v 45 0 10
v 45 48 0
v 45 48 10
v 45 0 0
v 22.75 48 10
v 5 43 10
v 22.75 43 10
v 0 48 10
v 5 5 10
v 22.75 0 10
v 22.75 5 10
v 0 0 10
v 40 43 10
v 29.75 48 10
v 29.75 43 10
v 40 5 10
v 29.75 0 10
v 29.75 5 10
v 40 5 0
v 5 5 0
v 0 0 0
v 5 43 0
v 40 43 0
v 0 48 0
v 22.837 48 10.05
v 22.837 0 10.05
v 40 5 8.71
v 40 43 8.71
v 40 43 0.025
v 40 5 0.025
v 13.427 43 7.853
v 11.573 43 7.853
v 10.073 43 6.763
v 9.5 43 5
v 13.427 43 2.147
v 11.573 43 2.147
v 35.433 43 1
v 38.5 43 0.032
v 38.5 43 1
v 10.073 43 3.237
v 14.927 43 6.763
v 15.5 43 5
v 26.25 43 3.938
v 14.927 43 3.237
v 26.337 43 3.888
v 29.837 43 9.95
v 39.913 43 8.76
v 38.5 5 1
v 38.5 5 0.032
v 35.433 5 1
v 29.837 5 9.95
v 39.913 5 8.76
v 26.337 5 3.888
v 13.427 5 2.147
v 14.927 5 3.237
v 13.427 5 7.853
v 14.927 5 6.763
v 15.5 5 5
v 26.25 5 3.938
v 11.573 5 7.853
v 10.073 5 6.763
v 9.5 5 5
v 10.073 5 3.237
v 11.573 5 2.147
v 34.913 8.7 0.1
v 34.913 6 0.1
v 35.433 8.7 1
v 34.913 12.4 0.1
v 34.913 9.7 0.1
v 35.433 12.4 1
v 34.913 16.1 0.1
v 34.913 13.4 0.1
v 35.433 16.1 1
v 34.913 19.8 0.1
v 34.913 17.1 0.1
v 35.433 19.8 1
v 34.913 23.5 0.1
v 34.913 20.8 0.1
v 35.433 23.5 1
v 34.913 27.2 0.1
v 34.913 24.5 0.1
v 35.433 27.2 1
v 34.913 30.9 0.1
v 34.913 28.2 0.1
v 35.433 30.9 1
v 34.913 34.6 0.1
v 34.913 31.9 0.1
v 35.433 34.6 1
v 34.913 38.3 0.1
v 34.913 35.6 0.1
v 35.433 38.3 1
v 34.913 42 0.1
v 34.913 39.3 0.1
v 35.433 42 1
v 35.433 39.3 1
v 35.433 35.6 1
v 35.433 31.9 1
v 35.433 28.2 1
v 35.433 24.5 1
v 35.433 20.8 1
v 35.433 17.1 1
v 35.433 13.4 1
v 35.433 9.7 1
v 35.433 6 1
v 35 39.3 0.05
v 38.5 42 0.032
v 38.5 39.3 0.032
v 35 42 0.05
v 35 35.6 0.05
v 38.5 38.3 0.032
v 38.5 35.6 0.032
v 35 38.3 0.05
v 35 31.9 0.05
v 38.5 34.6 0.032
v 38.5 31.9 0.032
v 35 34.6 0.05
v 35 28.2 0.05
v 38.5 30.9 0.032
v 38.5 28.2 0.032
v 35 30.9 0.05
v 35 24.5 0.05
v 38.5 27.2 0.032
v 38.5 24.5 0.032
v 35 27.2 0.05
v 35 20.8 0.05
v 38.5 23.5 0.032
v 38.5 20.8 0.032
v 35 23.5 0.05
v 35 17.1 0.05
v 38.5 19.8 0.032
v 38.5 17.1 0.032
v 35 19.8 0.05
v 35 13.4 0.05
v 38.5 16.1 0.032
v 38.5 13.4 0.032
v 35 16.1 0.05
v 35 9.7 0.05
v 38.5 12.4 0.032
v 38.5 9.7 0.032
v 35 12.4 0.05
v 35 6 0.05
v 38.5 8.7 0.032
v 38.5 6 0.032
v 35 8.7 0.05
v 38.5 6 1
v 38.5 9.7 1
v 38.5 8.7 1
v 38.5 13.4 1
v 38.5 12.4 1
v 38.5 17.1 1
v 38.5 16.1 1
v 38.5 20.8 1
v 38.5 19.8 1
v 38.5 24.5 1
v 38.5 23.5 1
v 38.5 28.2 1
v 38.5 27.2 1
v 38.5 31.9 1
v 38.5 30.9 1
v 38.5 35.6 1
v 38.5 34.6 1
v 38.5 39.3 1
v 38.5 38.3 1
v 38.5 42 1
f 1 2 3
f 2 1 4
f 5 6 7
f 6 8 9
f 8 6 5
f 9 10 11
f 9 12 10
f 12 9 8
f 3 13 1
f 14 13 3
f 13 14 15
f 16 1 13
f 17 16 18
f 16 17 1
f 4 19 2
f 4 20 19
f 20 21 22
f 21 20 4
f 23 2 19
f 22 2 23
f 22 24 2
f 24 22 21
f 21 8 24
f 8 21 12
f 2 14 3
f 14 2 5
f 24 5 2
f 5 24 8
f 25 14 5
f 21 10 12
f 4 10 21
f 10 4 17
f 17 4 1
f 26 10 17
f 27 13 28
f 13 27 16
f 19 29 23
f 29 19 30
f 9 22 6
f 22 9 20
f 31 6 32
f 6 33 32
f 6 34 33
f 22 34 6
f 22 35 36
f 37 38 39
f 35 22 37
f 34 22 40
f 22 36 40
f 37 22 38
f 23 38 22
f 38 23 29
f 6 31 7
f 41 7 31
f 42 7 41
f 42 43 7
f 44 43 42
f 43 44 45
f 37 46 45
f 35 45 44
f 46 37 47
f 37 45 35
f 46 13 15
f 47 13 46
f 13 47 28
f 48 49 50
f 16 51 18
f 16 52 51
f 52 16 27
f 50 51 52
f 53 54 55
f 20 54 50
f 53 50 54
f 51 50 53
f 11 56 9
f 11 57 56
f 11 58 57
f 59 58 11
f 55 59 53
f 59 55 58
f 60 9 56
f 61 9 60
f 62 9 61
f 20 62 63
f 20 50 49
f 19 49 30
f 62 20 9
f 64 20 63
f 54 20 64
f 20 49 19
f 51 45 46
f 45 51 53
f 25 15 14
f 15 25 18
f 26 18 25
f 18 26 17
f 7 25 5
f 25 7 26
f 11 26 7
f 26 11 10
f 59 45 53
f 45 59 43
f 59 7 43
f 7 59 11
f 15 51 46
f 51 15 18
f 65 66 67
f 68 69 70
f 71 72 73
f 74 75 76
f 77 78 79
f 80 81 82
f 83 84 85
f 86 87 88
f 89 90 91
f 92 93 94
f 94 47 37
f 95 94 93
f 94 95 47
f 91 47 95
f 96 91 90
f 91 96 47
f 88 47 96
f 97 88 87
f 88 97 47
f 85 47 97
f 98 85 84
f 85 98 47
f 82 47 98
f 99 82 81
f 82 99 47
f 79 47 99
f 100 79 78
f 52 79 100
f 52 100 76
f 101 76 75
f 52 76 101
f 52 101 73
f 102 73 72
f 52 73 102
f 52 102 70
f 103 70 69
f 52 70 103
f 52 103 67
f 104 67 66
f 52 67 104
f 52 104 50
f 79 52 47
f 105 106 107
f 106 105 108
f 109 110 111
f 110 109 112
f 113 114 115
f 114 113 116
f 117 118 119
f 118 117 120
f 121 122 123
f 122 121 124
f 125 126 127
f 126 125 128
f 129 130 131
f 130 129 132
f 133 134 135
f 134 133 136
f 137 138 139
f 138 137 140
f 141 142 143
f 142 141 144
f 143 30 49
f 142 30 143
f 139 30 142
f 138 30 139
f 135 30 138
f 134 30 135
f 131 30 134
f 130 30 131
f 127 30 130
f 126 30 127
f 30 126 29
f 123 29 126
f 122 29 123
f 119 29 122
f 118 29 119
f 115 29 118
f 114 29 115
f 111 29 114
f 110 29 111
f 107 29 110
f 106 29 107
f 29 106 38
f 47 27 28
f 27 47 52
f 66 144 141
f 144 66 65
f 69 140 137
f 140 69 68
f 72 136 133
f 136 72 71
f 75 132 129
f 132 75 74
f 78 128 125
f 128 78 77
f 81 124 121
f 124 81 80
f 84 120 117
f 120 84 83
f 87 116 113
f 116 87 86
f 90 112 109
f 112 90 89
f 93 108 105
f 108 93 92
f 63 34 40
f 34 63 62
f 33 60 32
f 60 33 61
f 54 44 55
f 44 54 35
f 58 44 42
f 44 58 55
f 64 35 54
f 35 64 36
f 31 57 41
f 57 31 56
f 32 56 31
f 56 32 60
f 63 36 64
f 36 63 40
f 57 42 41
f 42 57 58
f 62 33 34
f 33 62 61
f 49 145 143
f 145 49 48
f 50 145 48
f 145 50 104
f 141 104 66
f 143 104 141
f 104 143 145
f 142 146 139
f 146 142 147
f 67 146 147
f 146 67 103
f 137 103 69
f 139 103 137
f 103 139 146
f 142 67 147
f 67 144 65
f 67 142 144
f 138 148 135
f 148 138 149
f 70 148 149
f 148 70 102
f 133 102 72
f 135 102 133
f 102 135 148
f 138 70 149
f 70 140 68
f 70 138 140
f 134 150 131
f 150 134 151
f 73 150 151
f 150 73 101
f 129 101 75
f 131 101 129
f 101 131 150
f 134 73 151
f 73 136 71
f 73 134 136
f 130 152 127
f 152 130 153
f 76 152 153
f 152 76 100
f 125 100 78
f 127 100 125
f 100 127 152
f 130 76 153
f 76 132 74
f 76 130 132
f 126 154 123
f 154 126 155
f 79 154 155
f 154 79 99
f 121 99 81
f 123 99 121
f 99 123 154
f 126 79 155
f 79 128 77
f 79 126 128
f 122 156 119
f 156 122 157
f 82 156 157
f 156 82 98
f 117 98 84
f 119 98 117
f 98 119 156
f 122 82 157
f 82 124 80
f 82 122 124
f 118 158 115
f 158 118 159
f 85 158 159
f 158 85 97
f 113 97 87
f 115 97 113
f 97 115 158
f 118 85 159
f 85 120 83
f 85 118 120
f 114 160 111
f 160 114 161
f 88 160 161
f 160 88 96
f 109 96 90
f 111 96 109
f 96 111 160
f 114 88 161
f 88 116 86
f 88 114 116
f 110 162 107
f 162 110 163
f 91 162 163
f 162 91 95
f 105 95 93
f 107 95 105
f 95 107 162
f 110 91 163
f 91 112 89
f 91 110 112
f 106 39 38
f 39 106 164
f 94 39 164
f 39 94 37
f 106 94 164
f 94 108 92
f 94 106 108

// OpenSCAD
/*
this is a buckle 
used to lock on the strap in certain direction
allow it to move in one direction for the tightining
** still work in progress and testing




*/
tri_h=7;
lock_h=10;
lock_l=45;
lock_w=48;
upper_tri_y=26.25;
space=3.7;
wall_t=5;
tri2_h=10;
difference(){
union(){
difference(){
cube([lock_l,lock_w,lock_h]);
    translate([wall_t,wall_t,0])cube([lock_l-2*wall_t,lock_w-2*wall_t,lock_h]);
}

translate([upper_tri_y,0,lock_h])
translate([0,0,-tri_h*sin(60)])
hull(){
rotate([0,30,0])cube([.1,lock_w,tri_h]);
rotate([0,-30,0])cube([.1,lock_w,tri_h]);}

translate([lock_l-wall_t,0,0.05])
rotate([0,180,0])
translate([0,0,-tri2_h*sin(60)])
hull(){
rotate([0,30,0])cube([.1,lock_w,tri2_h]);
rotate([0,-30,0])cube([.1,lock_w,tri2_h]);}

translate([12.5,0,5])rotate([-90,0,0])cylinder(r=3,h=lock_w);
}
for(i=[wall_t:space :lock_w-wall_t]){
translate([lock_l-2.1*wall_t,i,0])cube([4,1,1]);
}
}
